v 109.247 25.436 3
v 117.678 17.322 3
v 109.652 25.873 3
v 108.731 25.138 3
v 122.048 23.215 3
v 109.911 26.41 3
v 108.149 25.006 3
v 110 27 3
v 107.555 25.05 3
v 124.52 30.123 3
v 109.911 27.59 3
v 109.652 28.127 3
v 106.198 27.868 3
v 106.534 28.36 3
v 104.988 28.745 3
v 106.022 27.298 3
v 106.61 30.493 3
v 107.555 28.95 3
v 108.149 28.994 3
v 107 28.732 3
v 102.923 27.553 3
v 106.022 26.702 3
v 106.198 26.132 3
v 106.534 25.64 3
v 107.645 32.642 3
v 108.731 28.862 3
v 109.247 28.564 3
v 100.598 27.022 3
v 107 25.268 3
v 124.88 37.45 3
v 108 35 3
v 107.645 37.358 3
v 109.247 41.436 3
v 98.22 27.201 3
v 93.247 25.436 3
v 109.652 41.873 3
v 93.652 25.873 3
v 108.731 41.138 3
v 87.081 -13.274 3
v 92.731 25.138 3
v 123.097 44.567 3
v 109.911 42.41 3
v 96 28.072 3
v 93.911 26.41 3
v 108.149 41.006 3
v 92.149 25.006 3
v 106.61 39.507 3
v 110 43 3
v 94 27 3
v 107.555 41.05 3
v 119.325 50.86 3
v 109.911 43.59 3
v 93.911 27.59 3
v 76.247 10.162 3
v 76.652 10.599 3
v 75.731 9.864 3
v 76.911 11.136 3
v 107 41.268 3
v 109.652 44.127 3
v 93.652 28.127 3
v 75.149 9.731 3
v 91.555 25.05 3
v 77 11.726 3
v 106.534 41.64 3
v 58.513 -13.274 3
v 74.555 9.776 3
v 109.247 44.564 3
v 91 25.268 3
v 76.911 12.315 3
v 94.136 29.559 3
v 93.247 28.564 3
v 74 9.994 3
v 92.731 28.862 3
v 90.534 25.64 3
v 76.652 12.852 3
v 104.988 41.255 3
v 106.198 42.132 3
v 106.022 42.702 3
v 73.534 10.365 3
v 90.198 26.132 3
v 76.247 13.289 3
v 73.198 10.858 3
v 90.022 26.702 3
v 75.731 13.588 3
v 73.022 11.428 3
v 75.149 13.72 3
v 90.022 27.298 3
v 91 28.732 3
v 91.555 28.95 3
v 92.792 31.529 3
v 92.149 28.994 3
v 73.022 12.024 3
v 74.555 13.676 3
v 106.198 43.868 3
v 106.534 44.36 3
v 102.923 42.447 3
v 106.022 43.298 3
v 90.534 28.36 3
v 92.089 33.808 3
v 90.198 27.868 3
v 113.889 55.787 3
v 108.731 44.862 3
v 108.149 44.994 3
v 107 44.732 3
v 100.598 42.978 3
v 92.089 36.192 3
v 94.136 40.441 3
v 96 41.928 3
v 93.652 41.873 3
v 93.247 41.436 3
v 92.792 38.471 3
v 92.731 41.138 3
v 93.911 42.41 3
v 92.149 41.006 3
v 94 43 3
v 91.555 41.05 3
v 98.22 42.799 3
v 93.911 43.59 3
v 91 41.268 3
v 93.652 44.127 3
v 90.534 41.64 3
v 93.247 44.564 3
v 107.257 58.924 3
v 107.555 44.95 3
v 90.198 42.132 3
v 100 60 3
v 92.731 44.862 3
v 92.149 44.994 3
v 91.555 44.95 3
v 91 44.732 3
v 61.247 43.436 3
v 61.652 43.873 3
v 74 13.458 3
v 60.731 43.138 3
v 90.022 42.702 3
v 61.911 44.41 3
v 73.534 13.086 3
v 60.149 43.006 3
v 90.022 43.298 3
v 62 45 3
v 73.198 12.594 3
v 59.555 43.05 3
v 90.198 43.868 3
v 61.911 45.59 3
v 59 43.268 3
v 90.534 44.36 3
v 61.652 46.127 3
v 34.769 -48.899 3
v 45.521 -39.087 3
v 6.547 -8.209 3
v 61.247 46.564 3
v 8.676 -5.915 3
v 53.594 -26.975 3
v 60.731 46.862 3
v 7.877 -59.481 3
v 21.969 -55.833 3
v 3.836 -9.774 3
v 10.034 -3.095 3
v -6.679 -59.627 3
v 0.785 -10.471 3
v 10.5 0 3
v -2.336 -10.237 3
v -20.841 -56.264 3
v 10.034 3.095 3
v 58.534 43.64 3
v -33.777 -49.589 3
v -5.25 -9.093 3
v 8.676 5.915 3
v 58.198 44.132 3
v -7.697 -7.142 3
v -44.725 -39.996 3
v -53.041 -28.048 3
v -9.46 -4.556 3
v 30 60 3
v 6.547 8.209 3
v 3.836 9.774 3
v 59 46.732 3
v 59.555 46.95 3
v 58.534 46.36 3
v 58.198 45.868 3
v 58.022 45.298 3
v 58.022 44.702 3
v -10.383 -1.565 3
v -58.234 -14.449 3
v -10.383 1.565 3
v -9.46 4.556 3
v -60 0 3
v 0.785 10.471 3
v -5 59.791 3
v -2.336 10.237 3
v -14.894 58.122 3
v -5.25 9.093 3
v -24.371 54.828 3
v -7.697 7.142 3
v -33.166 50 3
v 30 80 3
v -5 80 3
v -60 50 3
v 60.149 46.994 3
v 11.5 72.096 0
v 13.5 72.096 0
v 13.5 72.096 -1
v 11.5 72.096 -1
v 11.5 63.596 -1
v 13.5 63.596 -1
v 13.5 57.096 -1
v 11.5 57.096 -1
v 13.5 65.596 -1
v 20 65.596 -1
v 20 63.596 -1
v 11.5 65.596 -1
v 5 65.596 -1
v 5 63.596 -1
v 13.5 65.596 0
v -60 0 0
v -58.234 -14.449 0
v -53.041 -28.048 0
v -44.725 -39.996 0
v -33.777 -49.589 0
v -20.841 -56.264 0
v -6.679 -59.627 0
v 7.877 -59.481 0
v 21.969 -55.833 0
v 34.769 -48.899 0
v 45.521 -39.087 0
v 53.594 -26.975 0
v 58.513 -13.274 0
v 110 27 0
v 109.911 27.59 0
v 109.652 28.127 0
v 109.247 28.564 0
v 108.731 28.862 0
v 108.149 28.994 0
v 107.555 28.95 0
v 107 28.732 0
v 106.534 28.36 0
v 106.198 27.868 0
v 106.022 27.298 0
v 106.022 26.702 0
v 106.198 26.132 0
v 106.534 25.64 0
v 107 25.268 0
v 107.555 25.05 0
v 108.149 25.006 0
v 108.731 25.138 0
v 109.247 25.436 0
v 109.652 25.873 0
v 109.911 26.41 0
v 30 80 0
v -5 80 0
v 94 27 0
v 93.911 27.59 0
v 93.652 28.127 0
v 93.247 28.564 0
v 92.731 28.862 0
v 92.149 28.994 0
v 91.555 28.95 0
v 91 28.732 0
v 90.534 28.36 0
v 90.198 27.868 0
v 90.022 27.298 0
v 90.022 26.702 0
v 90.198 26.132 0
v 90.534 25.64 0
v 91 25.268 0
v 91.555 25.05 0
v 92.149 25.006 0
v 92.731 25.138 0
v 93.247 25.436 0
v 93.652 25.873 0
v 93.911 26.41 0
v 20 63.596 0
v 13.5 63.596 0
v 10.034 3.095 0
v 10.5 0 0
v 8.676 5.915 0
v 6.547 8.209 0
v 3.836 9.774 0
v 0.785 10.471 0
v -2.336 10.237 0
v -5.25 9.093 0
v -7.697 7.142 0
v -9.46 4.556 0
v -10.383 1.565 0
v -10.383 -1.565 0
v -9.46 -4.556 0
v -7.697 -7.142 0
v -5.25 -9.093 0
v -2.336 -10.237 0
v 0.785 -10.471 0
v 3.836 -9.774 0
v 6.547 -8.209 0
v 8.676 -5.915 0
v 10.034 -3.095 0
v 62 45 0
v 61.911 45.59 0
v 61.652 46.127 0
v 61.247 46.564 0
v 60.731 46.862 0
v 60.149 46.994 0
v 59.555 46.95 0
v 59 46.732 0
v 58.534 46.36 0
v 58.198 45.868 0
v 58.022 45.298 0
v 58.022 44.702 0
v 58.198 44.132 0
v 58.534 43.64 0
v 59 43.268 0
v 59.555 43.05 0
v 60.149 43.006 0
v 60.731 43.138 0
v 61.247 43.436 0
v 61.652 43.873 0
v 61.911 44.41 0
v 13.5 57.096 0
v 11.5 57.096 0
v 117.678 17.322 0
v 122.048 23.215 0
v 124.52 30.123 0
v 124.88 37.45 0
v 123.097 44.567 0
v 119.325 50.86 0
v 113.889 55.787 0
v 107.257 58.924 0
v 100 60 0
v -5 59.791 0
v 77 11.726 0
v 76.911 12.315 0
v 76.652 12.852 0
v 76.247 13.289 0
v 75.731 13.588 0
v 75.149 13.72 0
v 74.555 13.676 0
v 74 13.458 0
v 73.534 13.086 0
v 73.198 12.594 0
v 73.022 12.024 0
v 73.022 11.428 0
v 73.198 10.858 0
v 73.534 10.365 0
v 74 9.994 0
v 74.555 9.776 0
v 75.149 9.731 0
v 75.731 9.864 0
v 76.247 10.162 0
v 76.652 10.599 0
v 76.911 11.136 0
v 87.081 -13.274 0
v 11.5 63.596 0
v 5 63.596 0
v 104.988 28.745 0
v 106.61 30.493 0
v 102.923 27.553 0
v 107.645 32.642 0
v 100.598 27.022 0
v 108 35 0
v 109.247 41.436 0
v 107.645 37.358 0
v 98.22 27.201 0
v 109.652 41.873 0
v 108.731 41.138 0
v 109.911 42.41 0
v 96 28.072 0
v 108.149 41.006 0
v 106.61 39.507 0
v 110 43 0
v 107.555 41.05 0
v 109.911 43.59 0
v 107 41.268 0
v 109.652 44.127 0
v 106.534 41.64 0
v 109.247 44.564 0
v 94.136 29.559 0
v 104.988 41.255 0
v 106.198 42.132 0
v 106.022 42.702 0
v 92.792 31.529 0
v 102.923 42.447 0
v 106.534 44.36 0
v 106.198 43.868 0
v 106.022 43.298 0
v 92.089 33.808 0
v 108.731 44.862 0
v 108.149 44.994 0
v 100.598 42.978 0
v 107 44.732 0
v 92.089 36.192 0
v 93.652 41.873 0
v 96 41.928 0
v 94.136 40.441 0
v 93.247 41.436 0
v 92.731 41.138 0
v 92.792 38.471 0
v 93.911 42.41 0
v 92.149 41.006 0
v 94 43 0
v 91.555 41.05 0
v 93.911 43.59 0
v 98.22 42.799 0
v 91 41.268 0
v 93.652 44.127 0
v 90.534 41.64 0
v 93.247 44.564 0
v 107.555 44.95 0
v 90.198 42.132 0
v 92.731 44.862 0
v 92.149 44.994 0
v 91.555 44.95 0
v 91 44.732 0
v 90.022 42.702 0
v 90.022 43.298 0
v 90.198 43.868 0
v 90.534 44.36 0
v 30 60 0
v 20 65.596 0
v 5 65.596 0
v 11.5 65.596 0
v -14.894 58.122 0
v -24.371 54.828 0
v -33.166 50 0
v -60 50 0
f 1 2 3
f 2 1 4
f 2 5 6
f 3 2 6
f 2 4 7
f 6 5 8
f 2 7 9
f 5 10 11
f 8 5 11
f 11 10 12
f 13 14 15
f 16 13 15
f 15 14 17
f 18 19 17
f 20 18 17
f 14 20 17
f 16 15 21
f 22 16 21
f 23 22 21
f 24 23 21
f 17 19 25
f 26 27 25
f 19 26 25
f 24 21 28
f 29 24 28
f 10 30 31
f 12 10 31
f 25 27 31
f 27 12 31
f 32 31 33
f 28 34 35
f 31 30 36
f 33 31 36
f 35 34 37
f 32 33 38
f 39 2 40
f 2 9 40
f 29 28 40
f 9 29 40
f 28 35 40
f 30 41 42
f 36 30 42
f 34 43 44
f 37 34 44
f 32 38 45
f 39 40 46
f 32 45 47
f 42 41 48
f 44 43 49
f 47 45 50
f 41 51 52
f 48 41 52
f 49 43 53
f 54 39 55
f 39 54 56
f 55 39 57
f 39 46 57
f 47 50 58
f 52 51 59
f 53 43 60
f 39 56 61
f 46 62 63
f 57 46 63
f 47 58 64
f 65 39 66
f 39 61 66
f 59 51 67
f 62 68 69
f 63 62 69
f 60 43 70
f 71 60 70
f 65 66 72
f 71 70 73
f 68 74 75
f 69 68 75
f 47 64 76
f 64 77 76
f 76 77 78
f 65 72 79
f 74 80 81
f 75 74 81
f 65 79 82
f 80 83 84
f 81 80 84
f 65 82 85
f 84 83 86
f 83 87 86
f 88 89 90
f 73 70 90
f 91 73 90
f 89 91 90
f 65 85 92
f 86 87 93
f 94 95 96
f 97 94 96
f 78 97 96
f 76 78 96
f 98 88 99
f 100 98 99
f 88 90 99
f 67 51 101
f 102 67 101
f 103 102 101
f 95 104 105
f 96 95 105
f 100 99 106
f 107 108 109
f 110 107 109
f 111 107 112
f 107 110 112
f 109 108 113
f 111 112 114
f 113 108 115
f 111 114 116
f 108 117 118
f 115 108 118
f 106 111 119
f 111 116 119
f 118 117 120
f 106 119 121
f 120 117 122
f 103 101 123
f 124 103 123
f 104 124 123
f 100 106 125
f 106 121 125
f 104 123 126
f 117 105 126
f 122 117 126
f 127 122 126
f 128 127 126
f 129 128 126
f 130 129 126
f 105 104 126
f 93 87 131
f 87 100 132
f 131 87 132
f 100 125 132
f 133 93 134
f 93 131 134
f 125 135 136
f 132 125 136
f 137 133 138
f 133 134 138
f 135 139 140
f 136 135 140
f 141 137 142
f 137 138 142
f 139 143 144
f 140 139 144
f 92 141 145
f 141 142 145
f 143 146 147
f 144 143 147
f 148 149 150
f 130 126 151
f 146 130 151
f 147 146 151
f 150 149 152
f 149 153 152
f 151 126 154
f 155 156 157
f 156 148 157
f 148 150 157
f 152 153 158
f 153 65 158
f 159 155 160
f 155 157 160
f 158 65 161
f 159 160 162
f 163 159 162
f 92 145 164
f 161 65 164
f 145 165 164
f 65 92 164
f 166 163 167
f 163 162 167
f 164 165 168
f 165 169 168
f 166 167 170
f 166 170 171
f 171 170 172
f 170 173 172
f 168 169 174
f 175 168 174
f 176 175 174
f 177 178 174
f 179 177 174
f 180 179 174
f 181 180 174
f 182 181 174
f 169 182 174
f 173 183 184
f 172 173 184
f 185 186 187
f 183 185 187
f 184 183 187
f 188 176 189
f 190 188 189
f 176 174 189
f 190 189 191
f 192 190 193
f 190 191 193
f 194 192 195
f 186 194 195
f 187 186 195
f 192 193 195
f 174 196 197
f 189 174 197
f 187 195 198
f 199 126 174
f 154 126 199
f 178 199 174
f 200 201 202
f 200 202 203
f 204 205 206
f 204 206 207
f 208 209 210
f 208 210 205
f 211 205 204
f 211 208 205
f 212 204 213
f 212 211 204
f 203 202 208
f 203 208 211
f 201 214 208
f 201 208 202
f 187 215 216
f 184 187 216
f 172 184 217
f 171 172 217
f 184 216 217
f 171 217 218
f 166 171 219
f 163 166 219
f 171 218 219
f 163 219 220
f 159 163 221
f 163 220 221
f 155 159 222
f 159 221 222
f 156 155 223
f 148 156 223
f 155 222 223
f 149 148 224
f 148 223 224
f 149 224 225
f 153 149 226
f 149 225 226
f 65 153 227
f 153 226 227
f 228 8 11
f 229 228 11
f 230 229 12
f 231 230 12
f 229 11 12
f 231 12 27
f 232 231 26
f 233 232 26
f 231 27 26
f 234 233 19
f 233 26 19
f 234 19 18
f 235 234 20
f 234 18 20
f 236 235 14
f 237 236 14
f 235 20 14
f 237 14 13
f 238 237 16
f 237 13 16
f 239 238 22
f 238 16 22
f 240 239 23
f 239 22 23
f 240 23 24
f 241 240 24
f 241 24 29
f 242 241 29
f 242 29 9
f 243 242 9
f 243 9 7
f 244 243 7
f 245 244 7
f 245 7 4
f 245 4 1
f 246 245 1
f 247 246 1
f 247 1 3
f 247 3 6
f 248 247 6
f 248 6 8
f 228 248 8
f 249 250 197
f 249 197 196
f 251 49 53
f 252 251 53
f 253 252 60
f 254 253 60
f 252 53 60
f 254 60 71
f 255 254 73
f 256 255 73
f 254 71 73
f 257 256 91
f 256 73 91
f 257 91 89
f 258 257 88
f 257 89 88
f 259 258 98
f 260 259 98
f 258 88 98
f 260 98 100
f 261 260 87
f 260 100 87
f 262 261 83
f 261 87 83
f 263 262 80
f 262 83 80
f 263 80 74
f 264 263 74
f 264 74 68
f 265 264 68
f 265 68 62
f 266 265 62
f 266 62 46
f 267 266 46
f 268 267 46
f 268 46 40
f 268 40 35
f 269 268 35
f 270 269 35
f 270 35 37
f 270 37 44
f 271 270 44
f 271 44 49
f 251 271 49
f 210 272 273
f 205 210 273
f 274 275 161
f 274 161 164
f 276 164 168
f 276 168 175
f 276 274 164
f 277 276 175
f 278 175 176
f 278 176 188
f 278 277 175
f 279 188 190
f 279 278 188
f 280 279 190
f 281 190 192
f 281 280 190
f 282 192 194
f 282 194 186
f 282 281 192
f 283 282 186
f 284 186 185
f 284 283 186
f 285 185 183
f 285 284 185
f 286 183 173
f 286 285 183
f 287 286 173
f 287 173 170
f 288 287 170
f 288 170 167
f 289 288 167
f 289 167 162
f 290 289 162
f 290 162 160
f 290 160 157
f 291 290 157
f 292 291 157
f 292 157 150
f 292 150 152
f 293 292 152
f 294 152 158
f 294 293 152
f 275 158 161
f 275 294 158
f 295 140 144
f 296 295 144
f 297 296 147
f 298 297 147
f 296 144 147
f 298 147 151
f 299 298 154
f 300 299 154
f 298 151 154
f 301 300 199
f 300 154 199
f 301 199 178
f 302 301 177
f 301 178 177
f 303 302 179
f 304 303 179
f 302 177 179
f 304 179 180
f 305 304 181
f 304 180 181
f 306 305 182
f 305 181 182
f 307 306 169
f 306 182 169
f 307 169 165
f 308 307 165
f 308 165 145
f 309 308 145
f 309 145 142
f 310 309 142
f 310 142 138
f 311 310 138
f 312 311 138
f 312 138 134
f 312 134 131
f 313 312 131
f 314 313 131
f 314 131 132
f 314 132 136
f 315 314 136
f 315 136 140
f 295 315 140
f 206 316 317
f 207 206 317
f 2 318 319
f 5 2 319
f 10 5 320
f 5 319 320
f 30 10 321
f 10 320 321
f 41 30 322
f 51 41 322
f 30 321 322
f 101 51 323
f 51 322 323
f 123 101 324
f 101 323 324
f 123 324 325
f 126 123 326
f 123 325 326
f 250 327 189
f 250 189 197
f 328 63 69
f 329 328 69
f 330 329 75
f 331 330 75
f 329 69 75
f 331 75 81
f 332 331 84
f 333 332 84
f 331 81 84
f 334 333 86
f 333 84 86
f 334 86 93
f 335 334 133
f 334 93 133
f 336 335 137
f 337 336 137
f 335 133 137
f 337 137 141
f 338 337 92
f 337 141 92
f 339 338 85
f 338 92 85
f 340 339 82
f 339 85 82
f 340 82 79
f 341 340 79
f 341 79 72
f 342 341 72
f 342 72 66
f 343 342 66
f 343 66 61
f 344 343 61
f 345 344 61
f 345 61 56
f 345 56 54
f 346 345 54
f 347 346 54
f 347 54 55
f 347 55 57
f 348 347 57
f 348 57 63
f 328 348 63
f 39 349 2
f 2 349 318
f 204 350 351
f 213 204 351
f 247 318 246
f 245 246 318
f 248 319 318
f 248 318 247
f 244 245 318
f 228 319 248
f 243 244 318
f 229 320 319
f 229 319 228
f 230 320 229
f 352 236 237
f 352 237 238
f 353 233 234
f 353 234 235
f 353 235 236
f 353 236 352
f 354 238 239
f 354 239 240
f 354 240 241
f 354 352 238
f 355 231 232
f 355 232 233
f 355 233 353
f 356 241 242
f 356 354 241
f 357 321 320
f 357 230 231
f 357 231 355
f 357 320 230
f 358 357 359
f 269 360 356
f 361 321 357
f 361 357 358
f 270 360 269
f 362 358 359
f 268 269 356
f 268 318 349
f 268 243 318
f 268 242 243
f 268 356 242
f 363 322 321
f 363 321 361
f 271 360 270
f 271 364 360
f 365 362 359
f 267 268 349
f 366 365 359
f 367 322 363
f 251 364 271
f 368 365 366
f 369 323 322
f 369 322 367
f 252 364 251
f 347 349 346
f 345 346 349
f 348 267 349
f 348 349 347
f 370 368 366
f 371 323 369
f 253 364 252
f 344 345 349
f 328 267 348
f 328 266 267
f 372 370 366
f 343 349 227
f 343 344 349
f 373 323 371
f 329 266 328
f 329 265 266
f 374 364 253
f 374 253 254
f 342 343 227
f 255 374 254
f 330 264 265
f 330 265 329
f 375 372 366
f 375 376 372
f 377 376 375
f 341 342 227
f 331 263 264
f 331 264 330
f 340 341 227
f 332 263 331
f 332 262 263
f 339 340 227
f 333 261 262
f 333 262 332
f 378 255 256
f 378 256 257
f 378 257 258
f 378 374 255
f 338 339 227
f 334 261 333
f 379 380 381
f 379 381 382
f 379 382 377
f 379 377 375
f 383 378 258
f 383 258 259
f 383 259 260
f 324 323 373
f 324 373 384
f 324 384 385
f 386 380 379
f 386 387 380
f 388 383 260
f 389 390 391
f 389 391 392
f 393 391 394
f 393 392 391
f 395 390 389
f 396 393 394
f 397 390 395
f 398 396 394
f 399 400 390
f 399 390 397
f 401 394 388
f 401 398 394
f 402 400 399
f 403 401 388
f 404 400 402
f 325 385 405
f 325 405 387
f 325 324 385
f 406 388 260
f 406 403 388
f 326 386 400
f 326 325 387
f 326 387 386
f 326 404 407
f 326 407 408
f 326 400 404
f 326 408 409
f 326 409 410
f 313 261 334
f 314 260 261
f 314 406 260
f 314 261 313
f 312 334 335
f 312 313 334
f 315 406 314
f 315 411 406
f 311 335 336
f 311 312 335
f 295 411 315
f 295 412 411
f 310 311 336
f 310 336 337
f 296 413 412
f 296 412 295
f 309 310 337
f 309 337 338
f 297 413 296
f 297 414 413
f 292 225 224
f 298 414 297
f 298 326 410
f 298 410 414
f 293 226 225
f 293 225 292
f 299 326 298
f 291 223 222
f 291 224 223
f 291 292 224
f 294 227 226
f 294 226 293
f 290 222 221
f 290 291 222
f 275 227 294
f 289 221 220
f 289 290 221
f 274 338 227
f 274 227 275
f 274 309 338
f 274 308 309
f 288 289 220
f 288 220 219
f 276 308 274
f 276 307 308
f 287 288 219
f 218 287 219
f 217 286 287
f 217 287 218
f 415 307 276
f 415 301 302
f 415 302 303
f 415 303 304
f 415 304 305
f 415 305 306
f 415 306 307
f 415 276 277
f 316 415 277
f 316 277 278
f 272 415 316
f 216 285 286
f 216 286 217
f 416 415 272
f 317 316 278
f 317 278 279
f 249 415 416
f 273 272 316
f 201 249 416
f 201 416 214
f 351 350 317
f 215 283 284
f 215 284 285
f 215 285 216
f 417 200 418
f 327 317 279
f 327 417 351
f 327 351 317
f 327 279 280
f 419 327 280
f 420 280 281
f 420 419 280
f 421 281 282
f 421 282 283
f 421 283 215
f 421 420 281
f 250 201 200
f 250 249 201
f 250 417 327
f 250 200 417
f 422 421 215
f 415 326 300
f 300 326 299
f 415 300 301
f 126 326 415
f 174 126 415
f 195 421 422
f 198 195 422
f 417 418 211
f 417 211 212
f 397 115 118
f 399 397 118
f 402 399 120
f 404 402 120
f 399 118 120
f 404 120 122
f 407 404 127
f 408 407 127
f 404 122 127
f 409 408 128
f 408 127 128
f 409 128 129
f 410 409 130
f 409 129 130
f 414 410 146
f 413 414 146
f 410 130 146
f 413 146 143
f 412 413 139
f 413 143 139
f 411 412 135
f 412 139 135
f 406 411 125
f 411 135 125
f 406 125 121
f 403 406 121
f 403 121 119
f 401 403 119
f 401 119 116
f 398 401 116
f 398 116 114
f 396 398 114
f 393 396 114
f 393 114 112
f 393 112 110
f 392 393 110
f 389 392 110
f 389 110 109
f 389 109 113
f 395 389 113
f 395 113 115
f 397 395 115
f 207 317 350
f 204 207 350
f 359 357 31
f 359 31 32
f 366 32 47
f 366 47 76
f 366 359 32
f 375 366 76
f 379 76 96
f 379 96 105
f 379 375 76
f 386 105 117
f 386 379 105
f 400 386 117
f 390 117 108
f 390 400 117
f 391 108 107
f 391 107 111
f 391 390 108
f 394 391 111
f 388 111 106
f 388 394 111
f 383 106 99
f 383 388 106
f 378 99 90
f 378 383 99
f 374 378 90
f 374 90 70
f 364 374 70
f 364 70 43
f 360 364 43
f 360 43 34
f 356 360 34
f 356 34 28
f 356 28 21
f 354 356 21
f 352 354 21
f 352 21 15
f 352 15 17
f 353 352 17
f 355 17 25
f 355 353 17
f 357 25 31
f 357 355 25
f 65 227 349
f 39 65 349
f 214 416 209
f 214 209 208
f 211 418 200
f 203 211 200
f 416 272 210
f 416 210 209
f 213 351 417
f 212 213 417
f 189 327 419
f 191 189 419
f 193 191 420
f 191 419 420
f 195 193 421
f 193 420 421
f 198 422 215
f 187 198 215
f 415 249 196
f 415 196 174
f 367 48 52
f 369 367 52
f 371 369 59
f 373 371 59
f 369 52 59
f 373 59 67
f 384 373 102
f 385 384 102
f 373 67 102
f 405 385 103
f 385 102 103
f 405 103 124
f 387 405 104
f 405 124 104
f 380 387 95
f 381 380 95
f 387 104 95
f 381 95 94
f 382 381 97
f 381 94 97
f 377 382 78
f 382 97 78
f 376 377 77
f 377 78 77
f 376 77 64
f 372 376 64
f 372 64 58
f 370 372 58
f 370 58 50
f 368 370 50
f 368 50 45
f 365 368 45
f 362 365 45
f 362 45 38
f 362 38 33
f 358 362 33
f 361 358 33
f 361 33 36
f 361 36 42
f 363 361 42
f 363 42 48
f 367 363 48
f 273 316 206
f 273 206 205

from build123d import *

# Parameters (mm, degrees)
SKETCH1_R           = 10.5
SKETCH1_R_2         = 8
BOSS_EXTRUDE1_DEPTH = 3
CUT_EXTRUDE1_REACH  = 140.687
SKETCH2_R           = 2
BOSS_EXTRUDE2_DEPTH = 3
SKETCH4_W           = 2
SKETCH4_H           = 6.5
SKETCH4_W_2         = 6.5
SKETCH4_H_2         = 2
BOSS_EXTRUDE3_DEPTH = 1
SKETCH5_R           = 2
CUT_EXTRUDE2_DEPTH  = 10


with BuildPart() as part:
    # Sketch1 → Boss-Extrude1 (new body)
    # profile 1 of 2: a face of its own
    with BuildSketch(Plane.XY):
        with BuildLine():
            ThreePointArc((-60, 0), (-52.867640737, 28.372743309), (-33.166247904, 50))
            Line((-33.166247904, 50), (-60, 50))
            Line((-60, 50), (-60, 0))
        make_face()
    # profile 2 of 2: a face of its own
    with BuildSketch(Plane.XY):
        with BuildLine():
            ThreePointArc((0, 60), (-17.320508076, 57.445626465), (-33.166247904, 50))
            ThreePointArc((-33.166247904, 50), (-52.867640737, 28.372743309), (-60, 0))
            ThreePointArc((-60, 0), (-6.678621673, -59.627141576), (58.513200418, -13.274237334))
            Line((58.513200418, -13.274237334), (87.081101726, -13.274237334))
            Line((87.081101726, -13.274237334), (117.67766953, 17.32233047))
            ThreePointArc((117.67766953, 17.32233047), (123.096988313, 44.567085809), (100, 60))
            Line((100, 60), (0, 60))
        make_face()
        Circle(SKETCH1_R, mode=Mode.SUBTRACT)
        with Locations((100, 35)):
            Circle(SKETCH1_R_2, mode=Mode.SUBTRACT)
    extrude(amount=BOSS_EXTRUDE1_DEPTH)

    # Sketch2 → Cut-Extrude1 (cut, up to next)
    with BuildSketch(Plane.XY.offset(3), mode=Mode.PRIVATE) as cut_extrude1_sk1:
        with Locations((60, 45)):
            Circle(SKETCH2_R)
    cut_extrude1_tool1 = extrude(cut_extrude1_sk1.sketch, amount=-CUT_EXTRUDE1_REACH, mode=Mode.PRIVATE) & part.part
    # Sketch2 → Cut-Extrude1 (cut, up to next)
    with BuildSketch(Plane.XY.offset(3), mode=Mode.PRIVATE) as cut_extrude1_sk2:
        with Locations((75, 11.725762666)):
            Circle(SKETCH2_R)
    cut_extrude1_tool2 = extrude(cut_extrude1_sk2.sketch, amount=-CUT_EXTRUDE1_REACH, mode=Mode.PRIVATE) & part.part
    add(cut_extrude1_tool1.solids().sort_by_distance((60, 45, 3))[0], mode=Mode.SUBTRACT)
    add(cut_extrude1_tool2.solids().sort_by_distance((75, 11.725763, 3))[0], mode=Mode.SUBTRACT)

    # Sketch3 → Boss-Extrude2 (add)
    with BuildSketch(Plane(origin=(0, 0, 0), x_dir=(-1, 0, 0), z_dir=(0, 0, -1))):
        with BuildLine():
            Line((-30, 80), (-30, 60))
            Line((-30, 60), (0, 60))
            ThreePointArc((0, 60), (2.502176759, 59.947803225), (5, 59.791303716))
            Line((5, 59.791303716), (5, 80))
            Line((5, 80), (-30, 80))
        make_face()
    extrude(amount=-BOSS_EXTRUDE2_DEPTH)

    # Sketch4 → Boss-Extrude3 (add)
    with BuildSketch(Plane(origin=(0, 0, 0), x_dir=(-1, 0, 0), z_dir=(0, 0, -1))):
        with Locations((-12.5, 68.846087829)):
            Rectangle(SKETCH4_W, SKETCH4_H)
        with Locations((-16.75, 64.596087829)):
            Rectangle(SKETCH4_W_2, SKETCH4_H_2)
        with Locations((-12.5, 64.596087829)):
            Rectangle(SKETCH4_W, SKETCH4_H_2)
        with Locations((-8.25, 64.596087829)):
            Rectangle(SKETCH4_W_2, SKETCH4_H_2)
        with Locations((-12.5, 60.346087829)):
            Rectangle(SKETCH4_W, SKETCH4_H)
    extrude(amount=BOSS_EXTRUDE3_DEPTH)

    # Sketch5 → Cut-Extrude2 (cut)
    with BuildSketch(Plane.XY.offset(3)):
        with Locations((92, 43)):
            Circle(SKETCH5_R)
        with Locations((108, 43)):
            Circle(SKETCH5_R)
        with Locations((108, 27)):
            Circle(SKETCH5_R)
        with Locations((92, 27)):
            Circle(SKETCH5_R)
    extrude(amount=-CUT_EXTRUDE2_DEPTH, mode=Mode.SUBTRACT)


solid = part.part
